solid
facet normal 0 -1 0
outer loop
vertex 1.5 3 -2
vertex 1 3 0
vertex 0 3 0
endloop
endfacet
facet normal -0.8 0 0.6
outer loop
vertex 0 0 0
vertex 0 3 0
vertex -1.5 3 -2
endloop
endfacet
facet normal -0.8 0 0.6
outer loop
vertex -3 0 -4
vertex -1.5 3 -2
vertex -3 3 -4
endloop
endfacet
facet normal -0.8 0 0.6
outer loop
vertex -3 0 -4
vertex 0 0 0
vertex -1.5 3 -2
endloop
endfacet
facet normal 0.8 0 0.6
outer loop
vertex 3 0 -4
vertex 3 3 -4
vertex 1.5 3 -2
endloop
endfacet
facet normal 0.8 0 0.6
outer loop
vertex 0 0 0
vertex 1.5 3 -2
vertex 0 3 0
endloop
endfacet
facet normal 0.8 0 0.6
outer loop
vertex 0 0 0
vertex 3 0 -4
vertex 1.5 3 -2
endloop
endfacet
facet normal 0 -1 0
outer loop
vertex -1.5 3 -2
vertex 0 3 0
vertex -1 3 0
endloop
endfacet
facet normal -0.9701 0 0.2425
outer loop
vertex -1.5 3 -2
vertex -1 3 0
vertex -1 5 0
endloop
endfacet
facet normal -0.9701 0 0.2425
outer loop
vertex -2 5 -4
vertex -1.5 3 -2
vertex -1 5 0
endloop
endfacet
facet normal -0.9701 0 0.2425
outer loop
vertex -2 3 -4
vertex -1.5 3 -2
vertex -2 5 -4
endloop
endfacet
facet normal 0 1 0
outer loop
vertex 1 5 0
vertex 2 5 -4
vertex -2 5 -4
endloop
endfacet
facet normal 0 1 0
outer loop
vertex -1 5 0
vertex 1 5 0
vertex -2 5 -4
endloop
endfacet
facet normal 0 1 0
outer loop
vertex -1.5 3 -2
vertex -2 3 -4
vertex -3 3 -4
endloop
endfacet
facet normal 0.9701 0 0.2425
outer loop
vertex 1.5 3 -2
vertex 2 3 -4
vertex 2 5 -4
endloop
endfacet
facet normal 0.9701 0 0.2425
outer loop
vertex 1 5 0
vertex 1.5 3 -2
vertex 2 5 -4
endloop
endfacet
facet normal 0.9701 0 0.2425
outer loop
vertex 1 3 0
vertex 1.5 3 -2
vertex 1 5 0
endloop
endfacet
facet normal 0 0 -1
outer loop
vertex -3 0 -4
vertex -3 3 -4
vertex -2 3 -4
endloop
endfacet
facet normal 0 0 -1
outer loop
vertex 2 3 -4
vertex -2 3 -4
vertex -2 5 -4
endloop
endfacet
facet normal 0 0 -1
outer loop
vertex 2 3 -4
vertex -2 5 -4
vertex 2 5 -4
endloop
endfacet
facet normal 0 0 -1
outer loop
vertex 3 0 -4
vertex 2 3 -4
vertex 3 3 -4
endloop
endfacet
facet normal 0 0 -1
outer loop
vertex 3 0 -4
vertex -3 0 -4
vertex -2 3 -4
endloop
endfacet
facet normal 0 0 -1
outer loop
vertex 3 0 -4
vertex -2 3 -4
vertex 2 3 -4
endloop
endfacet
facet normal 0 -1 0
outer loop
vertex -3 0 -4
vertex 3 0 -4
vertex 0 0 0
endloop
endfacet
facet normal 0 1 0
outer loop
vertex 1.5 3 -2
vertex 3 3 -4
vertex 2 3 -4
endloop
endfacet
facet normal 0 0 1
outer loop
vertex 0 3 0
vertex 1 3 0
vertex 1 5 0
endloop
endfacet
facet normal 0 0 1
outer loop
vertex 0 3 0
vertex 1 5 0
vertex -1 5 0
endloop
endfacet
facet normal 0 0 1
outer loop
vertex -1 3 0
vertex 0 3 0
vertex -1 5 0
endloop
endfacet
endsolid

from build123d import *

# Parameters (mm, degrees)
BOSS_EXTRUDE1_DEPTH = 3
BOSS_EXTRUDE2_DEPTH = 2


with BuildPart() as part:
    # Sketch1 → Boss-Extrude1 (new body)
    with BuildSketch(Plane(origin=(0, 0, 0), x_dir=(1, 0, 0), z_dir=(0, 1, 0))):
        Polygon((0, 0), (-3, 4), (3, 4), align=None)
    extrude(amount=BOSS_EXTRUDE1_DEPTH)

    # Sketch2 → Boss-Extrude2 (add)
    with BuildSketch(Plane(origin=(0, 3, 0), x_dir=(1, 0, 0), z_dir=(0, 1, 0))):
        Polygon((2, 4), (1, 0), (-1, 0), (-2, 4), align=None)
    extrude(amount=BOSS_EXTRUDE2_DEPTH)


solid = part.part
